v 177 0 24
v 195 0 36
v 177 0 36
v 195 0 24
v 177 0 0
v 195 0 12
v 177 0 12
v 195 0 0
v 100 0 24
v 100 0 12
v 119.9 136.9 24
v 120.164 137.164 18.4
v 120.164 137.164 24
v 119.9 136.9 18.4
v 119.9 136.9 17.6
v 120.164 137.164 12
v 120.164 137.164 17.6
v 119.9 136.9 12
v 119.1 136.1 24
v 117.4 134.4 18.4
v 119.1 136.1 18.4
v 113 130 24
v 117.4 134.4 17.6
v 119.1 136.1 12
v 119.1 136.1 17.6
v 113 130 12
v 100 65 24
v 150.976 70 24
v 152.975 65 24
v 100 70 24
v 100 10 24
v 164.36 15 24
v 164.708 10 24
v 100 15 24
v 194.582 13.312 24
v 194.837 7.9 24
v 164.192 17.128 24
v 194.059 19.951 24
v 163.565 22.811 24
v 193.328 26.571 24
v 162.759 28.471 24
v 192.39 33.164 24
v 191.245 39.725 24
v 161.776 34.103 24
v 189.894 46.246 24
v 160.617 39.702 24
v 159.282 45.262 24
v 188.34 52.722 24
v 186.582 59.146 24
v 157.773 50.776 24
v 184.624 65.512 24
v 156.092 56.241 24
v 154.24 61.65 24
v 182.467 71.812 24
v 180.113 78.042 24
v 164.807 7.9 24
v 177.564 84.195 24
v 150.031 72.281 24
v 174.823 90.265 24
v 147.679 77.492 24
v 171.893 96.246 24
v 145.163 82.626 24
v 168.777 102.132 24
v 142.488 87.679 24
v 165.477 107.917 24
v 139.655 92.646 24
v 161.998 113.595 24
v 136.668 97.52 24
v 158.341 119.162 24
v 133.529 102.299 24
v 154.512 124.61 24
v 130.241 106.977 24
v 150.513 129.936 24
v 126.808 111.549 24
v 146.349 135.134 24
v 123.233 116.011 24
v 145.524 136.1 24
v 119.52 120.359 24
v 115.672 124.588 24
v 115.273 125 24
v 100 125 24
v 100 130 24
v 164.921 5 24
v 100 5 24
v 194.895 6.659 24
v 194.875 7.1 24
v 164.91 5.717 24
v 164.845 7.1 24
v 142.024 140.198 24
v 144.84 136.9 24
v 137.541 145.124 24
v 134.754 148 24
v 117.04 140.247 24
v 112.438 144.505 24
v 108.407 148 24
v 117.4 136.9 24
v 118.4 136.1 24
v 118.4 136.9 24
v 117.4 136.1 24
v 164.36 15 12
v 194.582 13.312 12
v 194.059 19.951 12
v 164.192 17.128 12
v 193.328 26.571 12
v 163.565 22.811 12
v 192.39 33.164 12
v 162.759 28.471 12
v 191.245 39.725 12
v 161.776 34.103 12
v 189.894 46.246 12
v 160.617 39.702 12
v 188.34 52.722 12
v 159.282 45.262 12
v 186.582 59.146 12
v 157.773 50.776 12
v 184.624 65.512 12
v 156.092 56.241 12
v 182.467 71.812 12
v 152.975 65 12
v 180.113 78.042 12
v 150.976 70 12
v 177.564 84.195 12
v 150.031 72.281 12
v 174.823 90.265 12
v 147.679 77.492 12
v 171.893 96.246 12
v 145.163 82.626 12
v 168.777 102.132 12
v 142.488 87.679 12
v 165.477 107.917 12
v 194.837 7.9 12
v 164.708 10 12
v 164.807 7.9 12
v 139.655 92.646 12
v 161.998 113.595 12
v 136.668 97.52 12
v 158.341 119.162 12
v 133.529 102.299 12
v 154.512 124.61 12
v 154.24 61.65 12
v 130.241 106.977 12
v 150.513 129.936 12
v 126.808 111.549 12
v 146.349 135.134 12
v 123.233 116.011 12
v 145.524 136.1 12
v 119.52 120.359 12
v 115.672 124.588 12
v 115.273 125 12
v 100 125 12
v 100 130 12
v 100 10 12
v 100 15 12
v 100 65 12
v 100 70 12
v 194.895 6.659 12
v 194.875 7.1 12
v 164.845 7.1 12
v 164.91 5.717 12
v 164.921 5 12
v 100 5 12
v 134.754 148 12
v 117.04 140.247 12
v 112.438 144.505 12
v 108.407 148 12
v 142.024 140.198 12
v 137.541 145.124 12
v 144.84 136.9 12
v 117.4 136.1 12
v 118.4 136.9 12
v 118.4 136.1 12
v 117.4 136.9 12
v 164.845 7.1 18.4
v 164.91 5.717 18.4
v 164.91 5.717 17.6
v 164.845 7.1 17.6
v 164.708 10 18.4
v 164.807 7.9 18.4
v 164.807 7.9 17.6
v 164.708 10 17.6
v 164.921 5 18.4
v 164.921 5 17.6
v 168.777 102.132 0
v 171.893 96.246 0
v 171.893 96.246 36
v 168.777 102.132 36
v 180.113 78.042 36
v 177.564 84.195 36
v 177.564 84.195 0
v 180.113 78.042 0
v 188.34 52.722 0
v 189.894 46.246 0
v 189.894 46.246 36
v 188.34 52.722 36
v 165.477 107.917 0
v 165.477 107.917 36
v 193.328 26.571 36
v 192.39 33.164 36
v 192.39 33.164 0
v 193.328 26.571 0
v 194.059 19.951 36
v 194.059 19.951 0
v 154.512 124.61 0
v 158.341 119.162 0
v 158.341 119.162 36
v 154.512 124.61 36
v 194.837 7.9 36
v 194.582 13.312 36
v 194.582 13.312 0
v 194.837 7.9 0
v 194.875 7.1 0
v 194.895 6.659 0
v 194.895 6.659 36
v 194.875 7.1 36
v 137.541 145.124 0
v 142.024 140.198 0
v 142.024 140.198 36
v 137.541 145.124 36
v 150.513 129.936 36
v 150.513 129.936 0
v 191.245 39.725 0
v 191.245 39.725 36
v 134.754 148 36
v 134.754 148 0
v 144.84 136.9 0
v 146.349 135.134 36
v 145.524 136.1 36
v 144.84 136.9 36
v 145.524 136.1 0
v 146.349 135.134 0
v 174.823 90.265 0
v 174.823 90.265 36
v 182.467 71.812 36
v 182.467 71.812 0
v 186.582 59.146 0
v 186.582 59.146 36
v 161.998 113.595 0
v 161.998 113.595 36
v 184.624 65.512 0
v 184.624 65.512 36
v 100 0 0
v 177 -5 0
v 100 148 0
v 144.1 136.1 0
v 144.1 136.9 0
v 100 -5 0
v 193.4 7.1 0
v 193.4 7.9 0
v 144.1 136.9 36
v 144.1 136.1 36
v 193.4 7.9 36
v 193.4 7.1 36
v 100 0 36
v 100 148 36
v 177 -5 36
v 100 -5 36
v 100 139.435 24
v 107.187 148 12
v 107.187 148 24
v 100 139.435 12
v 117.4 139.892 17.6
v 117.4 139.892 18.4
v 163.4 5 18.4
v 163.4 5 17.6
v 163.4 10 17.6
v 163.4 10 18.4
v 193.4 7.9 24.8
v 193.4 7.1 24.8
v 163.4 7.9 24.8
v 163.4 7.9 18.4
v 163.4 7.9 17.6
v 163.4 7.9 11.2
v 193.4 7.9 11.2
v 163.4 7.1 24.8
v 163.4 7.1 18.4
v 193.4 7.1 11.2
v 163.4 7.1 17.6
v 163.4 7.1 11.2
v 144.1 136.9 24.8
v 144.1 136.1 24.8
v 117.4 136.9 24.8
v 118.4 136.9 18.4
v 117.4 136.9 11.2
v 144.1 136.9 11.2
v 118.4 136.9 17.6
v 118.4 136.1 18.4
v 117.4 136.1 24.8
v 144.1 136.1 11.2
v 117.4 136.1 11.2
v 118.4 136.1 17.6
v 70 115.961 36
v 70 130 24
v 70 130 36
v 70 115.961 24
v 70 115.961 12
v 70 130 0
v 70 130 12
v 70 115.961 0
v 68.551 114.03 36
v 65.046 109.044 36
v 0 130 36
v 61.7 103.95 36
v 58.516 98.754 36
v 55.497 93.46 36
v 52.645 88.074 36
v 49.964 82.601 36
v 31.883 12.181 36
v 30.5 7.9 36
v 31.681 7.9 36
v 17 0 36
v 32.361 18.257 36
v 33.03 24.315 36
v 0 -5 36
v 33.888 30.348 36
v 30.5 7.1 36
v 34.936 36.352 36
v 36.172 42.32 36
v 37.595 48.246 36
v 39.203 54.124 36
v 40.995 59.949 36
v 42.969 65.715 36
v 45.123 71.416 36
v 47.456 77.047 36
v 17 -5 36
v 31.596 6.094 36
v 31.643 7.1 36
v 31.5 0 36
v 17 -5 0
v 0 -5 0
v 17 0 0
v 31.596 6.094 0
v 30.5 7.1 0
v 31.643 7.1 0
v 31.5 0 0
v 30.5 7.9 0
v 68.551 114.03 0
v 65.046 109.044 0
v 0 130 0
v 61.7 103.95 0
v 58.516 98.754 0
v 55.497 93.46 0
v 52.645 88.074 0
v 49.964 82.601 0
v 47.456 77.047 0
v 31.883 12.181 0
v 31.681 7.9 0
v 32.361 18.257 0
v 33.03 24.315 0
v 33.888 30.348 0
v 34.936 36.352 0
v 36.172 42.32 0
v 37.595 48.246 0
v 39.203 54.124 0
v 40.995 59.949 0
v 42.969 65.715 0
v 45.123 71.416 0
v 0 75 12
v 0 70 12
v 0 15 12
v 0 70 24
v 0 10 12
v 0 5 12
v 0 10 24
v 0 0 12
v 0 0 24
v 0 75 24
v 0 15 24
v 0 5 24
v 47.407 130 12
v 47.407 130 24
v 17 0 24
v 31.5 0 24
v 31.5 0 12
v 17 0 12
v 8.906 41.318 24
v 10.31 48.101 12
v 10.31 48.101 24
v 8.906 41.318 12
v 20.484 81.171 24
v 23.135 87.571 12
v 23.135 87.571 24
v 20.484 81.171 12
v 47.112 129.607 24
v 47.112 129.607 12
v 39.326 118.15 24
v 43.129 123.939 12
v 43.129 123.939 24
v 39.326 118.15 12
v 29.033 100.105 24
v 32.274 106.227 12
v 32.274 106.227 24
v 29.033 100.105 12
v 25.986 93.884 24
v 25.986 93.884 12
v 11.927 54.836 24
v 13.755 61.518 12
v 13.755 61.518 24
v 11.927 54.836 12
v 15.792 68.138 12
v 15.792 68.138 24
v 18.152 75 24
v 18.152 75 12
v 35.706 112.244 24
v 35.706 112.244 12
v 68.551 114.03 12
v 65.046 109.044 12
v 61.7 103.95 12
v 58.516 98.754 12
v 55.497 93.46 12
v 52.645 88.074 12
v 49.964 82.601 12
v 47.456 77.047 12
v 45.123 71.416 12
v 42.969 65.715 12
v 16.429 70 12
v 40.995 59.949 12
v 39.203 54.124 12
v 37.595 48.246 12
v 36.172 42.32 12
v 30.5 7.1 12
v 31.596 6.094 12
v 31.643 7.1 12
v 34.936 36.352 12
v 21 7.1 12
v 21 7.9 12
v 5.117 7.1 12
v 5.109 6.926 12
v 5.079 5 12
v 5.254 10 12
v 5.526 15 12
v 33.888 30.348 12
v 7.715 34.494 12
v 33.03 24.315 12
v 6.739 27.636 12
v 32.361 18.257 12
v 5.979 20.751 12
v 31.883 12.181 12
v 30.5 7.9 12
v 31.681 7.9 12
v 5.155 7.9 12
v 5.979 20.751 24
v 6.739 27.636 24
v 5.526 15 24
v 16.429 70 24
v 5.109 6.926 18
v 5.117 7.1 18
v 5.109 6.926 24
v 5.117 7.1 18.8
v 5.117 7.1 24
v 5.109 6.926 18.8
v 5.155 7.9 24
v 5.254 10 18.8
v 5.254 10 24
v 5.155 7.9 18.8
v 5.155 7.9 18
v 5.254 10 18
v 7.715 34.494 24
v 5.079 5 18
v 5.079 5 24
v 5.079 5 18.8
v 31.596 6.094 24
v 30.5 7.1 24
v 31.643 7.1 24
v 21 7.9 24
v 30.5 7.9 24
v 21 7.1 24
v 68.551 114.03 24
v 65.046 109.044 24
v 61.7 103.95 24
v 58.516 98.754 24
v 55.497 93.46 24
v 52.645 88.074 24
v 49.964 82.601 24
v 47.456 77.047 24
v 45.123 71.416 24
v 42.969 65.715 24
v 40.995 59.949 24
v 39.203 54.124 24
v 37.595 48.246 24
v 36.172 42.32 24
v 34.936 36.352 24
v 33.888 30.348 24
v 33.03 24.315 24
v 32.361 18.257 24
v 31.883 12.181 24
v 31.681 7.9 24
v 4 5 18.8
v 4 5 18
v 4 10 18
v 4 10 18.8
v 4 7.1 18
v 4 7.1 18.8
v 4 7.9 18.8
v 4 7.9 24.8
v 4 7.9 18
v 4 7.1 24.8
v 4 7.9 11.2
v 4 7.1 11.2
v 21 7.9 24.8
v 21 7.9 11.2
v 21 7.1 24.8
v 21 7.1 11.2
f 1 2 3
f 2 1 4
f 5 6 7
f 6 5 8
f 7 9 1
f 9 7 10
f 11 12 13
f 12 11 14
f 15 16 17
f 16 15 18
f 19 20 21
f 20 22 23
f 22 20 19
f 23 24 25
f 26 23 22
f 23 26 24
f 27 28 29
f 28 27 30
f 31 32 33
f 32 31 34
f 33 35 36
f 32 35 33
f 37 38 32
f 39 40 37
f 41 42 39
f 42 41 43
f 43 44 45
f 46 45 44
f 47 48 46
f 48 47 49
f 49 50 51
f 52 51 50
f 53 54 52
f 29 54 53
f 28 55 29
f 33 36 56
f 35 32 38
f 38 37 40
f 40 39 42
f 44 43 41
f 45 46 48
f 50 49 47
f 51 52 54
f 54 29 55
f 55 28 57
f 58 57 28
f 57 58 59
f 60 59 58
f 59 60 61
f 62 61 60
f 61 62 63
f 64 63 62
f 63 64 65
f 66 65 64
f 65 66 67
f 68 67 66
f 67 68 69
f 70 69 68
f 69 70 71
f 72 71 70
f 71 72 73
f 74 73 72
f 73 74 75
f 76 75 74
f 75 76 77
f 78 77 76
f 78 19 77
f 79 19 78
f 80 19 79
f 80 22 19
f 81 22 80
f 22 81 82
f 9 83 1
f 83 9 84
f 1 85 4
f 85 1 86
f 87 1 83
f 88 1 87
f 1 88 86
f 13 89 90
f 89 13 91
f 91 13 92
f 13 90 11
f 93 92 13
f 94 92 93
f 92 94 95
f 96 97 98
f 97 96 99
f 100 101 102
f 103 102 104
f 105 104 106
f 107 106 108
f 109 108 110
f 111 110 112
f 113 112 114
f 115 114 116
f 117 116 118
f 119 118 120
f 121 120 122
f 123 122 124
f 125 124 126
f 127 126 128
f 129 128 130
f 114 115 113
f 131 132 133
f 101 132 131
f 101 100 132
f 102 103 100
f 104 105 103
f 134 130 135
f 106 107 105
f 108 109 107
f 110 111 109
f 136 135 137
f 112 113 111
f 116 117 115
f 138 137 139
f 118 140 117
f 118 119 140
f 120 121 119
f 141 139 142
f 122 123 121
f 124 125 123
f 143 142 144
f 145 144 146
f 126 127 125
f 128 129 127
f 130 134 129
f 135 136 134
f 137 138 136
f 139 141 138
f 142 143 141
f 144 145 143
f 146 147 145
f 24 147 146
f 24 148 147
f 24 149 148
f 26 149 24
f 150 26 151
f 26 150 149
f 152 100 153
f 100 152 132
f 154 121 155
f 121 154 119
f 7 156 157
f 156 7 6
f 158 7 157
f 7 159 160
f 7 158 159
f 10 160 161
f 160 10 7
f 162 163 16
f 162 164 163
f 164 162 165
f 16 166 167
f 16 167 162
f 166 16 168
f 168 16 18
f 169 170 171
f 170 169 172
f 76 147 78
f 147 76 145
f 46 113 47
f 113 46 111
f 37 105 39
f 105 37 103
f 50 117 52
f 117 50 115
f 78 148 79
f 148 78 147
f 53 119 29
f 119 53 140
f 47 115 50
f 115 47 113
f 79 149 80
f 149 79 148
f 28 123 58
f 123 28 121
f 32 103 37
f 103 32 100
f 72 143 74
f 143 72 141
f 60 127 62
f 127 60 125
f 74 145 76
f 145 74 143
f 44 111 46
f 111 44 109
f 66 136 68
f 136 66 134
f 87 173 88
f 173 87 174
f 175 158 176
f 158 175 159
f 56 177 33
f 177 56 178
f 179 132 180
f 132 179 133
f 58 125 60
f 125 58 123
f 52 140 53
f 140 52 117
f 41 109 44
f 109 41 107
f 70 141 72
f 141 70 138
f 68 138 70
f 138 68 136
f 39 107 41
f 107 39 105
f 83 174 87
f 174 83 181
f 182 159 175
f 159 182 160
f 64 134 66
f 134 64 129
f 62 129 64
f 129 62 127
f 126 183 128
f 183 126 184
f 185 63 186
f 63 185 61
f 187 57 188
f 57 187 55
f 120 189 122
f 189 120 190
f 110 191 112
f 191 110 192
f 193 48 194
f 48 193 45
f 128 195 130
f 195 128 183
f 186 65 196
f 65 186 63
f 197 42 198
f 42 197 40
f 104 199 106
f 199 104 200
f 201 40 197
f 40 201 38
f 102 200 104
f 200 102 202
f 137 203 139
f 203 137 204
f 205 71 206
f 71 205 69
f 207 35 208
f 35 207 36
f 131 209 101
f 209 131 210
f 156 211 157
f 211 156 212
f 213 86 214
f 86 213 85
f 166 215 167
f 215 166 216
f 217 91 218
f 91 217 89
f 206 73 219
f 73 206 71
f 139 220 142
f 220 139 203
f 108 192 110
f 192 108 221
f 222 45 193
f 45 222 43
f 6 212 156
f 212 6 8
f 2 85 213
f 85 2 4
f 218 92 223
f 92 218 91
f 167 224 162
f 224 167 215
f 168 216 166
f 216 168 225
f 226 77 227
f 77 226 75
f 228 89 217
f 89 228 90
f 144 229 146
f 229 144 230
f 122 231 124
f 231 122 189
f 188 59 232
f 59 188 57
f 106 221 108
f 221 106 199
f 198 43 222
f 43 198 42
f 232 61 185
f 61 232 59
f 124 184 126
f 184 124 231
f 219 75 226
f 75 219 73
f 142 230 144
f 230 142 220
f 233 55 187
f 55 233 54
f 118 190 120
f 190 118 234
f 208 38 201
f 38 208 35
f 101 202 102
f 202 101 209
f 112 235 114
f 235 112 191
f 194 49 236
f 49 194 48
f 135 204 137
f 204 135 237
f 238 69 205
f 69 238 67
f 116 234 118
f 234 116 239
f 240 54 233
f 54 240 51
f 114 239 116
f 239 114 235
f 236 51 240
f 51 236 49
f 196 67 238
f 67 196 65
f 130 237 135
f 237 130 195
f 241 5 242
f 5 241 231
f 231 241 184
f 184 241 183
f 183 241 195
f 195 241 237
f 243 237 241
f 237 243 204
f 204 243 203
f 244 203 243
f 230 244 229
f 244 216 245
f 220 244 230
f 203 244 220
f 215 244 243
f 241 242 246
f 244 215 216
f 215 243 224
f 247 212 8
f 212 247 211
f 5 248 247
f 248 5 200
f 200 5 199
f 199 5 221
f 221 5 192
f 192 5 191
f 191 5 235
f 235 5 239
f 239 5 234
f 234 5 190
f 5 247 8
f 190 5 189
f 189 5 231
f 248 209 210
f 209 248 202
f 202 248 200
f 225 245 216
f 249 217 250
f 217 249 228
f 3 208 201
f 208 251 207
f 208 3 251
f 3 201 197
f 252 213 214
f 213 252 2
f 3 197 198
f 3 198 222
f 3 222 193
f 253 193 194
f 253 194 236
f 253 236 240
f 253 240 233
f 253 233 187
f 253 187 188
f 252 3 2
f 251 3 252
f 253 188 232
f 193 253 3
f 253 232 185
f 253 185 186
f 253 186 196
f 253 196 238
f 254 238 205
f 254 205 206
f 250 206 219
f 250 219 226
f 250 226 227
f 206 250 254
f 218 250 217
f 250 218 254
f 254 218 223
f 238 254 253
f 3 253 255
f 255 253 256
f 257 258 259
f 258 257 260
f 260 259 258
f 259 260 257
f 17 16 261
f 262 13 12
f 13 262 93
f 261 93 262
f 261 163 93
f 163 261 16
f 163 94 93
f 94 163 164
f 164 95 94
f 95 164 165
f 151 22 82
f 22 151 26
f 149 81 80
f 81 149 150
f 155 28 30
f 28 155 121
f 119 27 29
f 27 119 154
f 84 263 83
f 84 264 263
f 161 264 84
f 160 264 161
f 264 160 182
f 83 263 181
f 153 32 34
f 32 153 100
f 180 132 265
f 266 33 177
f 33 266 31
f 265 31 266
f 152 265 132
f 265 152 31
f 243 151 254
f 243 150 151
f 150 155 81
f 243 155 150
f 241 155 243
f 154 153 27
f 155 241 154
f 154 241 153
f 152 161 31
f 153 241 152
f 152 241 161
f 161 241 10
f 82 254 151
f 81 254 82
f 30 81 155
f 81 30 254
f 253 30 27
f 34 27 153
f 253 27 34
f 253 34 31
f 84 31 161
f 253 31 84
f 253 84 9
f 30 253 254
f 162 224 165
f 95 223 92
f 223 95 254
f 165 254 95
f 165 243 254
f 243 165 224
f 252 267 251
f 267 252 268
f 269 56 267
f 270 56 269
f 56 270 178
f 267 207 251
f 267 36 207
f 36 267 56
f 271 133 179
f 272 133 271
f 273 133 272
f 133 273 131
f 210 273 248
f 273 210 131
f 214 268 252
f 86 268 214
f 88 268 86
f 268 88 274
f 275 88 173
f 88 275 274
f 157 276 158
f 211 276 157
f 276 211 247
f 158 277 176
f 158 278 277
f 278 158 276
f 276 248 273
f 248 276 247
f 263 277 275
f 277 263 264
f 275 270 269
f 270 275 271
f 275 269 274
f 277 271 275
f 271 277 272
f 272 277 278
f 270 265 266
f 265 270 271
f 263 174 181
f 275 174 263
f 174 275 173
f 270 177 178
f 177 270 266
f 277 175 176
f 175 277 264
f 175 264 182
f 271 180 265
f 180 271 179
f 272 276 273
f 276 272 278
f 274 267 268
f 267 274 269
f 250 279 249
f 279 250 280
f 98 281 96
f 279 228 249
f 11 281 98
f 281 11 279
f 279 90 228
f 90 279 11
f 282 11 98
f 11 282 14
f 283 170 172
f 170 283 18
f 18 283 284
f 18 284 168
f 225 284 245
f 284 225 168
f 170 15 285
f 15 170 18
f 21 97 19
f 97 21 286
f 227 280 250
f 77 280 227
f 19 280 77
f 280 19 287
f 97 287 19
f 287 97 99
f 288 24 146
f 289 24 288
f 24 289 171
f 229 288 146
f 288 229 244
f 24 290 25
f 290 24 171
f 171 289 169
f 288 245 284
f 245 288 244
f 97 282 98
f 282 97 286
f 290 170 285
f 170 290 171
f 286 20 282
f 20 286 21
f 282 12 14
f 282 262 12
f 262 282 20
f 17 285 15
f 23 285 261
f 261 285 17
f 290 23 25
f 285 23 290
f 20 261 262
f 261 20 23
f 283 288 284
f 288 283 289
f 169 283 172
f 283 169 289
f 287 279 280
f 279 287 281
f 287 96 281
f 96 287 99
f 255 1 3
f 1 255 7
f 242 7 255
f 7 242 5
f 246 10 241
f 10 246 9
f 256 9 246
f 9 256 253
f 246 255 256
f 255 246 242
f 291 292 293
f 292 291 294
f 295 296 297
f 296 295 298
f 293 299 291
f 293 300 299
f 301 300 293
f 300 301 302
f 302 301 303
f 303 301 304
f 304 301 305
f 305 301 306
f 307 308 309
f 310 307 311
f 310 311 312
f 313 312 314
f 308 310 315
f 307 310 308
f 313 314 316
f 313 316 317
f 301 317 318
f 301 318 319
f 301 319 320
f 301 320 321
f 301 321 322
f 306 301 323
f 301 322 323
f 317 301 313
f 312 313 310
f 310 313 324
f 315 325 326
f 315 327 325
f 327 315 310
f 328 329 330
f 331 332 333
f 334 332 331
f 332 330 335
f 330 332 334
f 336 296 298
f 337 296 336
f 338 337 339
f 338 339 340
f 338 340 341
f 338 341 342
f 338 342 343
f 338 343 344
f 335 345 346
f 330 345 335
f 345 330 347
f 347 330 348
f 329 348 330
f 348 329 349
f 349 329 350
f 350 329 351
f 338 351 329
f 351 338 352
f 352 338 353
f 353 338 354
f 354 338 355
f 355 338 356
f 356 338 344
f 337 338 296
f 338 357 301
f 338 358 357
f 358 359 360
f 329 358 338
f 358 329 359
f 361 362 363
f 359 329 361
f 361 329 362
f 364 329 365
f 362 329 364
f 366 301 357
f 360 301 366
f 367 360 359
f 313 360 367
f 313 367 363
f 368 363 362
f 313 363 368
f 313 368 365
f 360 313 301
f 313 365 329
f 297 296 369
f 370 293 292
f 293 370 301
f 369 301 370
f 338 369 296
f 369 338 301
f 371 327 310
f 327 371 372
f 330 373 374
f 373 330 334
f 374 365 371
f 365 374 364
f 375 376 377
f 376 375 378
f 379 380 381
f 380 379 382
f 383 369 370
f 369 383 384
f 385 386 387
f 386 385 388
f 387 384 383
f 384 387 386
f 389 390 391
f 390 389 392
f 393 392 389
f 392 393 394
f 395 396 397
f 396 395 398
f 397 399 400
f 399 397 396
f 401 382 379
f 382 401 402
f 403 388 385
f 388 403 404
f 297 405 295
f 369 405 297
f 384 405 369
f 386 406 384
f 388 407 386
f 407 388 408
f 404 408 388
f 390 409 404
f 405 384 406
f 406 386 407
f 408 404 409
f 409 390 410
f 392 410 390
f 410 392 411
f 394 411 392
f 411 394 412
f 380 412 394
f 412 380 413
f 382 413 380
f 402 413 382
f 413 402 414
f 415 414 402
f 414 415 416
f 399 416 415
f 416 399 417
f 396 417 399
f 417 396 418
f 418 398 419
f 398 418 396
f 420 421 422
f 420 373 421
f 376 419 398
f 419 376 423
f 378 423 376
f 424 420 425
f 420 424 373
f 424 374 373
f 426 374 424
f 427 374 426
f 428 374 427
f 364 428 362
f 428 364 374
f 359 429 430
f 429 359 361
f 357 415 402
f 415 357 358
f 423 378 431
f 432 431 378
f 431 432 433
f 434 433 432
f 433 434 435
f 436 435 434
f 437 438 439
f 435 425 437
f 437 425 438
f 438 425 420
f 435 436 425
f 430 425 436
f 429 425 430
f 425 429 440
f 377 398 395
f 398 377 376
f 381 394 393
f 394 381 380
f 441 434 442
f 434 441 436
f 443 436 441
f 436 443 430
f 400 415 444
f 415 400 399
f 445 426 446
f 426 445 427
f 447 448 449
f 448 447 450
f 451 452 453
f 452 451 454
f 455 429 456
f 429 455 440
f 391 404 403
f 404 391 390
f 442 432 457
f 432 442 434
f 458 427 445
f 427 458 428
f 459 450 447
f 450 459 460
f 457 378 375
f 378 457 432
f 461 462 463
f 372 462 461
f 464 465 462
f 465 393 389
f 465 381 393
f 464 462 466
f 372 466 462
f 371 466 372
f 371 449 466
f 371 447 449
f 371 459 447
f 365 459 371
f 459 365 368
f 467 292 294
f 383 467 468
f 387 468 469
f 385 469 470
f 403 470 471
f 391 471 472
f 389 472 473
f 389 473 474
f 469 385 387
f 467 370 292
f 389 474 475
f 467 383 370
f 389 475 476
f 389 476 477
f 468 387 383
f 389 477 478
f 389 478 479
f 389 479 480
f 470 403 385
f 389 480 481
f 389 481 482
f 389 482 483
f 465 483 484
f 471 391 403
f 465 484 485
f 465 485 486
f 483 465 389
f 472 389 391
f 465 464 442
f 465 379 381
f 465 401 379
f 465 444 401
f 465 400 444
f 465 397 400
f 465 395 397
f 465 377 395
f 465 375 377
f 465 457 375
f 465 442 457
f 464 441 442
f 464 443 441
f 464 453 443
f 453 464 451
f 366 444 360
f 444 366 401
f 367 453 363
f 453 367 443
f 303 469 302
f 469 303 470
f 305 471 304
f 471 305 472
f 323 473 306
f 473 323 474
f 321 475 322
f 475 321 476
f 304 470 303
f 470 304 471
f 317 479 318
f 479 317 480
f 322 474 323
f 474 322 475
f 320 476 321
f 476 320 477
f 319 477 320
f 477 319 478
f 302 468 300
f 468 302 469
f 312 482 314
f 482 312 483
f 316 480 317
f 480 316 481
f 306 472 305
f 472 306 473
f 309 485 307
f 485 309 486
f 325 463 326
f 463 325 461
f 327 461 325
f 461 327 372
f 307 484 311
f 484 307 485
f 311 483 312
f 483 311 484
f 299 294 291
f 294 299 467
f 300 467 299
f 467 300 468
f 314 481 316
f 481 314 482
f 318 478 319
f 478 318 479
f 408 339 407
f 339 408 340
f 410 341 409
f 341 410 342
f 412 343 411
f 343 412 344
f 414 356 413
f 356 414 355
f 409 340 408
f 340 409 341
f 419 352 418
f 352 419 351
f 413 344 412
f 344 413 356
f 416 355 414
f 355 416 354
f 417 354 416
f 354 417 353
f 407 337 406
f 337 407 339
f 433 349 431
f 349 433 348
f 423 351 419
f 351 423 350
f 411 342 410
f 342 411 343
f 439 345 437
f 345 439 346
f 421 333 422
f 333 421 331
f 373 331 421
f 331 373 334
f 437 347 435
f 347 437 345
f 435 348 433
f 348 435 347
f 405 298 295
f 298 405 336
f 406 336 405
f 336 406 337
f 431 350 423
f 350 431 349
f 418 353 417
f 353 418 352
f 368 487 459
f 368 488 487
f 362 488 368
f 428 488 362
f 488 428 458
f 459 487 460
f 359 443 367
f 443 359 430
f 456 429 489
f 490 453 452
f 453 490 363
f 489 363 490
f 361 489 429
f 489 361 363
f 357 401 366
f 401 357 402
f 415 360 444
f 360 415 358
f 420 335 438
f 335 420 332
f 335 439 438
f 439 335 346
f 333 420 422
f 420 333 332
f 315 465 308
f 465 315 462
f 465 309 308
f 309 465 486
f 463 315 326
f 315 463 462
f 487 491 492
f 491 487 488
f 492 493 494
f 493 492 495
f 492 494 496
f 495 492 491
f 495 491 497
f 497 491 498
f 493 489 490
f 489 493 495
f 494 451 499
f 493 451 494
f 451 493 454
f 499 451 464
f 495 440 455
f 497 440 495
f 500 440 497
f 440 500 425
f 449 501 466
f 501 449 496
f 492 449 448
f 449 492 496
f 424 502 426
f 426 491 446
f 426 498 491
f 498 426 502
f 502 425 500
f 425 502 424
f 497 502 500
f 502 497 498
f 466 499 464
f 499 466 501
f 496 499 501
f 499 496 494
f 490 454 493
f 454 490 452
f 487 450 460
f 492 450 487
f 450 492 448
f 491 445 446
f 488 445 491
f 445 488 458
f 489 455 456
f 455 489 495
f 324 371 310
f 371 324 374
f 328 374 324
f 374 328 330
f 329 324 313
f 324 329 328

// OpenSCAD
// file: specification_of_components.scad
// Copyright 2020,2024 Martin Scheidt (Attribution 4.0 International, CC-BY 4.0)
//
// You are free to copy and redistribute the material in any medium or format.
// You are free to remix, transform, and build upon the material for any purpose, even commercially.
// You must give appropriate credit, provide a link to the license, and indicate if changes were made.
// You may not apply legal terms or technological measures that legally restrict others from doing anything the license permits.
// No warranties are given.

/*****
To have the dimensions of all components at one place
*******/

/*******
TODO
- standardisation of move tolerance
- standard on which part the move tolerance is substracted?
******/
// ATTENTION: Note the general move_tolerance of 0.5

move_tolerance = 0.5;

/***************wood rail specification***************/
wood_thickness_middle = 11.5;
wood_thickness_rail = 5.5;
wodd_width = 38.5;

straight_length = 144.5;

curve_radius = 182; // inner radius
curve_angle = 45; // degree

/***************magnet specifications***************/
magnet_thickness = 3;
magnet_diameter = 5;
magnet_distance_to_middle = 7.5;
magnet_z = 5.75;

/***************engraving specifications***************/
engraving_height = 1.5;//(block_height-handle_height)/2;
engraving_thickness = 1.5;

/***************switch_blade_optimized***************/

//blade specification
blade_thickness = 2.5;
blade_cover_thicknes = 0.6; //attention: female blade is thinner -> effect on lever_anchor pins?
blade_length = 45;
blade_width  = 19;

//lever anchor specification
lever_hole_size = 2.7;
lever_anchor_posX = blade_width*1/5;
lever_anchor_posY = blade_length*0.8111;

//pin specification
pin_diameter = 5;
pin_female_diameter = pin_diameter+1.5;
pin_height = wood_thickness_rail+2; //2mm move tolerance
y_pos_first_pin = pin_diameter;
y_pos_second_pin = (blade_length*2/3);
overlap = blade_thickness-blade_cover_thicknes; // height of pin_hole, otherwise the pin_hole doesn't stand on the blade -> bug?

/***************overlap_measure***************/
// ATTENTION: Note the general move_tolerance of 0.5

/***************locking_pin***************/
locker_width = 14;
locker_height = 25;
lever_height = 10;
lever_thickness_switch = 4;
rounding = 0.5;

/***************distant-main_signal***************/
block_width=undef;

// body specifications
axis_diameter = 2.5; //maybe use the same material as lever anchor
body_width = 30; // material constraint
body_depth = 50; // minimum, because of the lockpin diameter
body_height = 13.5; // material constraint
wall_thickness_x = (body_width-block_width)/2-move_tolerance;//5;
wall_thickness_y = lever_thickness_switch;
wall_thickness_z = 2;
track_arc_inner_radius = 182;
sagitta = 0.43; //DE: Pfeilhöhe -> 25mm Straighten round edge in the middle
z_pos_axis = 10; // the block_height=13.5 lies a bit heigher, previous: block_height/2+wall_thickness_z

// Locking Part specifications
lock_lever_depth = 9.5;
lock_lever_thickness = 2.5;
lock_lever_height = 10;
foot_width = 2.5;

// color_block specifications
block_width = 20; //material constraint //body_width-2*wall_thickness_x-move_tolerance;
block_depth = (body_depth-2*wall_thickness_y)/2-3*move_tolerance;
block_height = 13.5; // material constraint
//block_height =(body_height-wall_thickness_z)*1.4; //the heigher the value, the more color_block comes out of the body. BUT also: the higher will be the axis hole
overhang = block_height/2-2*move_tolerance; //the circle has to be flattend at one side with move_tolerance
handle_depth = 10+wall_thickness_y;
handle_height = 3;

//Symbol Specifications
signal_symbol_side_space = 4;
signal_symbol_size = block_width-2*signal_symbol_side_space;
signal_triangle_height = (sqrt(3)*signal_symbol_size)/2;

/***************FZS_SZS***************/
zs_with = 25;
zs_depth = 10;
zs_height = 15;

cp_symbol_side_space = 2;
cp_symbol_size = zs_depth-2*cp_symbol_side_space;

/***************drill_template_straight***************/
line_thickness = 0.8;
// drill straight ground
dsg_thickness = 5;
dsg_hole_depth = 5;
// drill straight cutout = dsc
dsc_connector_width = 19;
dsc_rail_width = 73;
dsc_y_pos = 12;
dsc_depth = wood_thickness_middle+move_tolerance;

dsc_connector_z_pos = dsg_thickness+12;
dsc_supporting_surface_width = 50;

// drill straight hole
dsh_y_pos = 12/2;
dsh_x_pos = 7.5;



// drill straigth base = dsb
dsb_width = dsc_rail_width+dsc_connector_width;
dsb_depth = 2*dsc_y_pos+dsc_depth;
dsb_height = 27;


/***************drill_template_curve***************/
// drill template curve = dtc
dtc_cutout_middle_angle = 45+5;

dtc_cutout_z_pos = 12;
dtc_cutout_height = dsc_depth;
dtc_outer_radius = curve_radius+wodd_width;
dtc_side_radius = curve_radius + 30;
dtc_middle_radius = curve_radius + 12;
dtc_inner_radius = curve_radius;

dtc_height = 2*dtc_cutout_z_pos+dtc_cutout_height;

// drill template curve hole
dtch_z_pos = 12/2;
dtch_y_pos = 7.5;

dtc_switch_hole_y_pos = 136.5;
// main file
// Copyright 2024 Martin Scheidt (Attribution 4.0 International, CC-BY 4.0)
//
// You are free to copy and redistribute the material in any medium or format.
// You are free to remix, transform, and build upon the material for any purpose, even commercially.
// You must give appropriate credit, provide a link to the license, and indicate if changes were made.
// You may not apply legal terms or technological measures that legally restrict others from doing anything the license permits.
// No warranties are given.

include<./specification_of_components.scad>

$fn = 200;

module connector_cutout(){
    translate([0,0,dtc_cutout_z_pos]) difference(){
        rotate_extrude(angle = dtc_cutout_middle_angle) square([dtc_side_radius+1, dtc_cutout_height]);
        rotate_extrude(angle = dtc_cutout_middle_angle) square([dtc_middle_radius,dtc_cutout_height]);
    }
}

module inner_curve_cutout(){
    translate([0,0,dtc_cutout_z_pos]) difference(){
        rotate_extrude(angle = curve_angle) square([dtc_side_radius+1, dtc_cutout_height]);
        rotate_extrude(angle = curve_angle) square([dtc_inner_radius,dtc_cutout_height]);        
    }
}

module outer_curve_cutout(){
    translate([dtc_outer_radius+dsg_thickness,0,dtc_cutout_z_pos])rotate([0,0,180-curve_angle])rotate_extrude(angle = curve_angle) square([dtc_outer_radius, dtc_cutout_height]);
}

module template_outer_curve(){

translate([-(dtc_inner_radius-65),0,0])difference(){ 
difference(){
    rotate_extrude(angle = 90) square([dtc_side_radius, dtc_height]);
    inner_curve_cutout();
}
    connector_cutout();
    //ground holes
    translate([0,125,dtc_cutout_z_pos]) cube([dtc_inner_radius, dsg_hole_depth, dtc_cutout_height]);
    translate([0,65,dtc_cutout_z_pos]) cube([dtc_inner_radius, dsg_hole_depth, dtc_cutout_height]);
    translate([0,0,dtc_cutout_z_pos]) cube([dtc_inner_radius, dsg_hole_depth, dtc_cutout_height]);
    translate([0,10,dtc_cutout_z_pos]) cube([dtc_inner_radius, dsg_hole_depth, dtc_cutout_height]);
    
    // trim template to relevant size
    cube([dtc_inner_radius-65, dtc_side_radius, dtc_height]);
    translate([dtc_inner_radius-65,148,0])cube([50, 50, dtc_height]);
    
    // hole position lines
    translate([dtc_side_radius-2*line_thickness, dtch_y_pos-line_thickness/2, dtc_cutout_z_pos+dtc_cutout_height])cube([2*line_thickness, line_thickness, dtc_cutout_height]);
    translate([dtc_side_radius-2*line_thickness, dtch_y_pos-line_thickness/2, dtc_cutout_z_pos-dtc_cutout_height])cube([2*line_thickness, line_thickness, dtc_cutout_height]);
    translate([dtc_inner_radius-2*line_thickness, dtch_y_pos-line_thickness/2, dtc_cutout_z_pos])cube([2*line_thickness, line_thickness, dtc_cutout_height]);
    translate([dtc_inner_radius-2*line_thickness, dtch_y_pos-dtc_cutout_height/2,dtc_cutout_z_pos+dtch_z_pos-line_thickness/2]) cube([2*line_thickness, dtc_cutout_height, line_thickness]);
    translate([dtc_inner_radius-2*line_thickness,dtch_y_pos-line_thickness/2, dtc_cutout_z_pos-line_thickness]) cube([dtc_side_radius-dtc_inner_radius, line_thickness, line_thickness]);
    translate([dtc_inner_radius-2*line_thickness,dtch_y_pos-line_thickness/2, dtc_cutout_z_pos+dtc_cutout_height]) cube([dtc_side_radius-dtc_inner_radius, line_thickness, line_thickness]);

    // hole position lines for switch hole (straight junction)
    translate([dtc_side_radius-2*line_thickness-49.3, dtc_switch_hole_y_pos-line_thickness/2, dtc_cutout_z_pos+dtc_cutout_height])cube([2*line_thickness, line_thickness, dtc_cutout_height]);
    translate([dtc_side_radius-2*line_thickness-49.3, dtc_switch_hole_y_pos-line_thickness/2, dtc_cutout_z_pos-dtc_cutout_height])cube([2*line_thickness, line_thickness, dtc_cutout_height]);
    translate([dtc_inner_radius-2*line_thickness-45, dtc_switch_hole_y_pos-line_thickness/2, dtc_cutout_z_pos])cube([2*line_thickness, line_thickness, dtc_cutout_height]);
    translate([dtc_inner_radius-2*line_thickness-46, dtc_switch_hole_y_pos-dtc_cutout_height/2,dtc_cutout_z_pos+dtch_z_pos-line_thickness/2]) cube([4*line_thickness, dtc_cutout_height, line_thickness]);
    translate([dtc_inner_radius-2*line_thickness-46,dtc_switch_hole_y_pos-line_thickness/2, dtc_cutout_z_pos-line_thickness]) cube([dtc_side_radius-dtc_inner_radius, line_thickness, line_thickness]);
    translate([dtc_inner_radius-2*line_thickness-46,dtc_switch_hole_y_pos-line_thickness/2, dtc_cutout_z_pos+dtc_cutout_height]) cube([dtc_side_radius-dtc_inner_radius, line_thickness, line_thickness]);
}
translate([0,-5,0]) cube([65+12,5,dtc_height]);
}

module template_inner_curve(){
difference(){
    cube([70, 130, 2*dtc_cutout_z_pos+dtc_cutout_height]);
    outer_curve_cutout();
    // curved sides
    translate([dtc_outer_radius+dsg_thickness,0,dtc_cutout_z_pos+dtc_cutout_height])rotate([0,0,180-curve_angle])rotate_extrude(angle = curve_angle) square([dtc_middle_radius, dtc_cutout_z_pos]);
    translate([dtc_outer_radius+dsg_thickness,0,0])rotate([0,0,180-curve_angle])rotate_extrude(angle = curve_angle) square([dtc_middle_radius, dtc_cutout_z_pos]);
    
    // ground holes
    translate([0,0,dtc_cutout_z_pos])cube([70, dsg_hole_depth, dtc_cutout_height]);
    translate([0,10,dtc_cutout_z_pos])cube([70, dsg_hole_depth, dtc_cutout_height]);
    translate([0,70,dtc_cutout_z_pos])cube([70, dsg_hole_depth, dtc_cutout_height]);
    
    // hole position lines
    translate([30.5, dtch_y_pos-line_thickness/2, dtc_cutout_z_pos-dtc_cutout_height]) cube([2*line_thickness, line_thickness, dtc_cutout_height]);
    translate([30.5, dtch_y_pos-line_thickness/2, dtc_cutout_z_pos+dtc_cutout_height]) cube([2*line_thickness, line_thickness, dtc_cutout_height]);
    translate([4, dtch_y_pos-line_thickness/2, dtc_cutout_z_pos]) cube([2*line_thickness, line_thickness, dtc_cutout_height]);
    translate([4, dtch_y_pos-line_thickness/2,dtc_cutout_z_pos-line_thickness])cube([dtc_cutout_z_pos+5, line_thickness, line_thickness]);
    translate([4, dtch_y_pos-line_thickness/2,dtc_cutout_z_pos+dtc_cutout_height])cube([dtc_cutout_z_pos+5, line_thickness, line_thickness]);
    translate([4, dtch_y_pos-5/2, dtc_cutout_z_pos+dtch_z_pos]) cube([2*line_thickness, 5, line_thickness]);
}
translate([0,-5,0])cube([dsg_thickness+12,5,2*dtc_cutout_z_pos+dtc_cutout_height]);
}

//template_outer_curve();
translate([100,0,0]) template_outer_curve();
template_inner_curve();
